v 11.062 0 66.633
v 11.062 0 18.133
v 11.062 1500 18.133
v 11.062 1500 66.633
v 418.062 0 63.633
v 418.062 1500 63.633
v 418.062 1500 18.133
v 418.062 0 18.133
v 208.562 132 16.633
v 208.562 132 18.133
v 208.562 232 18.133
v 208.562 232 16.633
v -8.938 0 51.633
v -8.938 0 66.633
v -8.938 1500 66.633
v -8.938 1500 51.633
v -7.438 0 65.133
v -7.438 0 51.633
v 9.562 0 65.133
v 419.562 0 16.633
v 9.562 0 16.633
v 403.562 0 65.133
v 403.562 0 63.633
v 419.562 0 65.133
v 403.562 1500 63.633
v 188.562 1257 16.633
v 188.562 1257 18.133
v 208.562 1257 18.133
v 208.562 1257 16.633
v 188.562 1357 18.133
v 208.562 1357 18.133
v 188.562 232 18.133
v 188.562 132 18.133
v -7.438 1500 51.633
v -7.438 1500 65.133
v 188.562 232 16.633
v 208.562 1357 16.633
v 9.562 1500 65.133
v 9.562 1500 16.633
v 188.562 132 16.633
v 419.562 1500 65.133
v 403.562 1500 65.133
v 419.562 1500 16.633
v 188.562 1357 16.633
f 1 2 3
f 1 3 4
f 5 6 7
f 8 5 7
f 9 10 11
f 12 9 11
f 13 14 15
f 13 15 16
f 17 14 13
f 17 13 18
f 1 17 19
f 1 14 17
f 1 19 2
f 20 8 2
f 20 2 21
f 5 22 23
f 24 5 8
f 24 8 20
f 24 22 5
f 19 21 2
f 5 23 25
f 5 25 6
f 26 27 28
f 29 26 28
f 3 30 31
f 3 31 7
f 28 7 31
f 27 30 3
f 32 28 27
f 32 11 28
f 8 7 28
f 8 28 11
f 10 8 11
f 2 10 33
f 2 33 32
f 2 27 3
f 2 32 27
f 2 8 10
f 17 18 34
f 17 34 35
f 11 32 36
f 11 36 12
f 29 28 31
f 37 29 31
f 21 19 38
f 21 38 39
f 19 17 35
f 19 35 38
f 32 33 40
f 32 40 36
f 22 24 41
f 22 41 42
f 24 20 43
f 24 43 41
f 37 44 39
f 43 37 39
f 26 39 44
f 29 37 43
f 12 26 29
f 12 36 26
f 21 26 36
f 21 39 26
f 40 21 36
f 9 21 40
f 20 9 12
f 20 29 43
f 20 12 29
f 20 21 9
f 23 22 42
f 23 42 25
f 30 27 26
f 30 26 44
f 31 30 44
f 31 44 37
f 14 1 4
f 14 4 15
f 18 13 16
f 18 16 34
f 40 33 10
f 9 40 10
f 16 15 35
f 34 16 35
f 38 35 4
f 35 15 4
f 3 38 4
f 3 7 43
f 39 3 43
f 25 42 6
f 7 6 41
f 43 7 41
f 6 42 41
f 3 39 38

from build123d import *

# Parameters (mm, degrees)
F1_DEPTH = 1500
F2_W     = 20
F2_H     = 100
F3_DEPTH = 1.5


with BuildPart() as f1:
    # F0 (on Front) → F1 (new body)
    with BuildSketch(Plane.XZ):
        Polygon((9.56153, 65.133369), (9.56153, 16.633369), (419.56153, 16.633369), (419.56153, 65.133369), (403.56153, 65.133369), (403.56153, 63.633369), (418.06153, 63.633369), (418.06153, 18.133369), (11.06153, 18.133369), (11.06153, 66.633369), (-8.93847, 66.633369), (-8.93847, 51.633369), (-7.43847, 51.633369), (-7.43847, 65.133369), align=None)
    extrude(amount=-F1_DEPTH)

    # F2 (on face) → F3 (cut, through all)
    with BuildSketch(Plane.XY.offset(18.133369)):
        with Locations((198.56153, 182)):
            Rectangle(F2_W, F2_H)
        with Locations((198.56153, 1307)):
            Rectangle(F2_W, F2_H)
    extrude(amount=-F3_DEPTH, mode=Mode.SUBTRACT)


solid = f1.part
